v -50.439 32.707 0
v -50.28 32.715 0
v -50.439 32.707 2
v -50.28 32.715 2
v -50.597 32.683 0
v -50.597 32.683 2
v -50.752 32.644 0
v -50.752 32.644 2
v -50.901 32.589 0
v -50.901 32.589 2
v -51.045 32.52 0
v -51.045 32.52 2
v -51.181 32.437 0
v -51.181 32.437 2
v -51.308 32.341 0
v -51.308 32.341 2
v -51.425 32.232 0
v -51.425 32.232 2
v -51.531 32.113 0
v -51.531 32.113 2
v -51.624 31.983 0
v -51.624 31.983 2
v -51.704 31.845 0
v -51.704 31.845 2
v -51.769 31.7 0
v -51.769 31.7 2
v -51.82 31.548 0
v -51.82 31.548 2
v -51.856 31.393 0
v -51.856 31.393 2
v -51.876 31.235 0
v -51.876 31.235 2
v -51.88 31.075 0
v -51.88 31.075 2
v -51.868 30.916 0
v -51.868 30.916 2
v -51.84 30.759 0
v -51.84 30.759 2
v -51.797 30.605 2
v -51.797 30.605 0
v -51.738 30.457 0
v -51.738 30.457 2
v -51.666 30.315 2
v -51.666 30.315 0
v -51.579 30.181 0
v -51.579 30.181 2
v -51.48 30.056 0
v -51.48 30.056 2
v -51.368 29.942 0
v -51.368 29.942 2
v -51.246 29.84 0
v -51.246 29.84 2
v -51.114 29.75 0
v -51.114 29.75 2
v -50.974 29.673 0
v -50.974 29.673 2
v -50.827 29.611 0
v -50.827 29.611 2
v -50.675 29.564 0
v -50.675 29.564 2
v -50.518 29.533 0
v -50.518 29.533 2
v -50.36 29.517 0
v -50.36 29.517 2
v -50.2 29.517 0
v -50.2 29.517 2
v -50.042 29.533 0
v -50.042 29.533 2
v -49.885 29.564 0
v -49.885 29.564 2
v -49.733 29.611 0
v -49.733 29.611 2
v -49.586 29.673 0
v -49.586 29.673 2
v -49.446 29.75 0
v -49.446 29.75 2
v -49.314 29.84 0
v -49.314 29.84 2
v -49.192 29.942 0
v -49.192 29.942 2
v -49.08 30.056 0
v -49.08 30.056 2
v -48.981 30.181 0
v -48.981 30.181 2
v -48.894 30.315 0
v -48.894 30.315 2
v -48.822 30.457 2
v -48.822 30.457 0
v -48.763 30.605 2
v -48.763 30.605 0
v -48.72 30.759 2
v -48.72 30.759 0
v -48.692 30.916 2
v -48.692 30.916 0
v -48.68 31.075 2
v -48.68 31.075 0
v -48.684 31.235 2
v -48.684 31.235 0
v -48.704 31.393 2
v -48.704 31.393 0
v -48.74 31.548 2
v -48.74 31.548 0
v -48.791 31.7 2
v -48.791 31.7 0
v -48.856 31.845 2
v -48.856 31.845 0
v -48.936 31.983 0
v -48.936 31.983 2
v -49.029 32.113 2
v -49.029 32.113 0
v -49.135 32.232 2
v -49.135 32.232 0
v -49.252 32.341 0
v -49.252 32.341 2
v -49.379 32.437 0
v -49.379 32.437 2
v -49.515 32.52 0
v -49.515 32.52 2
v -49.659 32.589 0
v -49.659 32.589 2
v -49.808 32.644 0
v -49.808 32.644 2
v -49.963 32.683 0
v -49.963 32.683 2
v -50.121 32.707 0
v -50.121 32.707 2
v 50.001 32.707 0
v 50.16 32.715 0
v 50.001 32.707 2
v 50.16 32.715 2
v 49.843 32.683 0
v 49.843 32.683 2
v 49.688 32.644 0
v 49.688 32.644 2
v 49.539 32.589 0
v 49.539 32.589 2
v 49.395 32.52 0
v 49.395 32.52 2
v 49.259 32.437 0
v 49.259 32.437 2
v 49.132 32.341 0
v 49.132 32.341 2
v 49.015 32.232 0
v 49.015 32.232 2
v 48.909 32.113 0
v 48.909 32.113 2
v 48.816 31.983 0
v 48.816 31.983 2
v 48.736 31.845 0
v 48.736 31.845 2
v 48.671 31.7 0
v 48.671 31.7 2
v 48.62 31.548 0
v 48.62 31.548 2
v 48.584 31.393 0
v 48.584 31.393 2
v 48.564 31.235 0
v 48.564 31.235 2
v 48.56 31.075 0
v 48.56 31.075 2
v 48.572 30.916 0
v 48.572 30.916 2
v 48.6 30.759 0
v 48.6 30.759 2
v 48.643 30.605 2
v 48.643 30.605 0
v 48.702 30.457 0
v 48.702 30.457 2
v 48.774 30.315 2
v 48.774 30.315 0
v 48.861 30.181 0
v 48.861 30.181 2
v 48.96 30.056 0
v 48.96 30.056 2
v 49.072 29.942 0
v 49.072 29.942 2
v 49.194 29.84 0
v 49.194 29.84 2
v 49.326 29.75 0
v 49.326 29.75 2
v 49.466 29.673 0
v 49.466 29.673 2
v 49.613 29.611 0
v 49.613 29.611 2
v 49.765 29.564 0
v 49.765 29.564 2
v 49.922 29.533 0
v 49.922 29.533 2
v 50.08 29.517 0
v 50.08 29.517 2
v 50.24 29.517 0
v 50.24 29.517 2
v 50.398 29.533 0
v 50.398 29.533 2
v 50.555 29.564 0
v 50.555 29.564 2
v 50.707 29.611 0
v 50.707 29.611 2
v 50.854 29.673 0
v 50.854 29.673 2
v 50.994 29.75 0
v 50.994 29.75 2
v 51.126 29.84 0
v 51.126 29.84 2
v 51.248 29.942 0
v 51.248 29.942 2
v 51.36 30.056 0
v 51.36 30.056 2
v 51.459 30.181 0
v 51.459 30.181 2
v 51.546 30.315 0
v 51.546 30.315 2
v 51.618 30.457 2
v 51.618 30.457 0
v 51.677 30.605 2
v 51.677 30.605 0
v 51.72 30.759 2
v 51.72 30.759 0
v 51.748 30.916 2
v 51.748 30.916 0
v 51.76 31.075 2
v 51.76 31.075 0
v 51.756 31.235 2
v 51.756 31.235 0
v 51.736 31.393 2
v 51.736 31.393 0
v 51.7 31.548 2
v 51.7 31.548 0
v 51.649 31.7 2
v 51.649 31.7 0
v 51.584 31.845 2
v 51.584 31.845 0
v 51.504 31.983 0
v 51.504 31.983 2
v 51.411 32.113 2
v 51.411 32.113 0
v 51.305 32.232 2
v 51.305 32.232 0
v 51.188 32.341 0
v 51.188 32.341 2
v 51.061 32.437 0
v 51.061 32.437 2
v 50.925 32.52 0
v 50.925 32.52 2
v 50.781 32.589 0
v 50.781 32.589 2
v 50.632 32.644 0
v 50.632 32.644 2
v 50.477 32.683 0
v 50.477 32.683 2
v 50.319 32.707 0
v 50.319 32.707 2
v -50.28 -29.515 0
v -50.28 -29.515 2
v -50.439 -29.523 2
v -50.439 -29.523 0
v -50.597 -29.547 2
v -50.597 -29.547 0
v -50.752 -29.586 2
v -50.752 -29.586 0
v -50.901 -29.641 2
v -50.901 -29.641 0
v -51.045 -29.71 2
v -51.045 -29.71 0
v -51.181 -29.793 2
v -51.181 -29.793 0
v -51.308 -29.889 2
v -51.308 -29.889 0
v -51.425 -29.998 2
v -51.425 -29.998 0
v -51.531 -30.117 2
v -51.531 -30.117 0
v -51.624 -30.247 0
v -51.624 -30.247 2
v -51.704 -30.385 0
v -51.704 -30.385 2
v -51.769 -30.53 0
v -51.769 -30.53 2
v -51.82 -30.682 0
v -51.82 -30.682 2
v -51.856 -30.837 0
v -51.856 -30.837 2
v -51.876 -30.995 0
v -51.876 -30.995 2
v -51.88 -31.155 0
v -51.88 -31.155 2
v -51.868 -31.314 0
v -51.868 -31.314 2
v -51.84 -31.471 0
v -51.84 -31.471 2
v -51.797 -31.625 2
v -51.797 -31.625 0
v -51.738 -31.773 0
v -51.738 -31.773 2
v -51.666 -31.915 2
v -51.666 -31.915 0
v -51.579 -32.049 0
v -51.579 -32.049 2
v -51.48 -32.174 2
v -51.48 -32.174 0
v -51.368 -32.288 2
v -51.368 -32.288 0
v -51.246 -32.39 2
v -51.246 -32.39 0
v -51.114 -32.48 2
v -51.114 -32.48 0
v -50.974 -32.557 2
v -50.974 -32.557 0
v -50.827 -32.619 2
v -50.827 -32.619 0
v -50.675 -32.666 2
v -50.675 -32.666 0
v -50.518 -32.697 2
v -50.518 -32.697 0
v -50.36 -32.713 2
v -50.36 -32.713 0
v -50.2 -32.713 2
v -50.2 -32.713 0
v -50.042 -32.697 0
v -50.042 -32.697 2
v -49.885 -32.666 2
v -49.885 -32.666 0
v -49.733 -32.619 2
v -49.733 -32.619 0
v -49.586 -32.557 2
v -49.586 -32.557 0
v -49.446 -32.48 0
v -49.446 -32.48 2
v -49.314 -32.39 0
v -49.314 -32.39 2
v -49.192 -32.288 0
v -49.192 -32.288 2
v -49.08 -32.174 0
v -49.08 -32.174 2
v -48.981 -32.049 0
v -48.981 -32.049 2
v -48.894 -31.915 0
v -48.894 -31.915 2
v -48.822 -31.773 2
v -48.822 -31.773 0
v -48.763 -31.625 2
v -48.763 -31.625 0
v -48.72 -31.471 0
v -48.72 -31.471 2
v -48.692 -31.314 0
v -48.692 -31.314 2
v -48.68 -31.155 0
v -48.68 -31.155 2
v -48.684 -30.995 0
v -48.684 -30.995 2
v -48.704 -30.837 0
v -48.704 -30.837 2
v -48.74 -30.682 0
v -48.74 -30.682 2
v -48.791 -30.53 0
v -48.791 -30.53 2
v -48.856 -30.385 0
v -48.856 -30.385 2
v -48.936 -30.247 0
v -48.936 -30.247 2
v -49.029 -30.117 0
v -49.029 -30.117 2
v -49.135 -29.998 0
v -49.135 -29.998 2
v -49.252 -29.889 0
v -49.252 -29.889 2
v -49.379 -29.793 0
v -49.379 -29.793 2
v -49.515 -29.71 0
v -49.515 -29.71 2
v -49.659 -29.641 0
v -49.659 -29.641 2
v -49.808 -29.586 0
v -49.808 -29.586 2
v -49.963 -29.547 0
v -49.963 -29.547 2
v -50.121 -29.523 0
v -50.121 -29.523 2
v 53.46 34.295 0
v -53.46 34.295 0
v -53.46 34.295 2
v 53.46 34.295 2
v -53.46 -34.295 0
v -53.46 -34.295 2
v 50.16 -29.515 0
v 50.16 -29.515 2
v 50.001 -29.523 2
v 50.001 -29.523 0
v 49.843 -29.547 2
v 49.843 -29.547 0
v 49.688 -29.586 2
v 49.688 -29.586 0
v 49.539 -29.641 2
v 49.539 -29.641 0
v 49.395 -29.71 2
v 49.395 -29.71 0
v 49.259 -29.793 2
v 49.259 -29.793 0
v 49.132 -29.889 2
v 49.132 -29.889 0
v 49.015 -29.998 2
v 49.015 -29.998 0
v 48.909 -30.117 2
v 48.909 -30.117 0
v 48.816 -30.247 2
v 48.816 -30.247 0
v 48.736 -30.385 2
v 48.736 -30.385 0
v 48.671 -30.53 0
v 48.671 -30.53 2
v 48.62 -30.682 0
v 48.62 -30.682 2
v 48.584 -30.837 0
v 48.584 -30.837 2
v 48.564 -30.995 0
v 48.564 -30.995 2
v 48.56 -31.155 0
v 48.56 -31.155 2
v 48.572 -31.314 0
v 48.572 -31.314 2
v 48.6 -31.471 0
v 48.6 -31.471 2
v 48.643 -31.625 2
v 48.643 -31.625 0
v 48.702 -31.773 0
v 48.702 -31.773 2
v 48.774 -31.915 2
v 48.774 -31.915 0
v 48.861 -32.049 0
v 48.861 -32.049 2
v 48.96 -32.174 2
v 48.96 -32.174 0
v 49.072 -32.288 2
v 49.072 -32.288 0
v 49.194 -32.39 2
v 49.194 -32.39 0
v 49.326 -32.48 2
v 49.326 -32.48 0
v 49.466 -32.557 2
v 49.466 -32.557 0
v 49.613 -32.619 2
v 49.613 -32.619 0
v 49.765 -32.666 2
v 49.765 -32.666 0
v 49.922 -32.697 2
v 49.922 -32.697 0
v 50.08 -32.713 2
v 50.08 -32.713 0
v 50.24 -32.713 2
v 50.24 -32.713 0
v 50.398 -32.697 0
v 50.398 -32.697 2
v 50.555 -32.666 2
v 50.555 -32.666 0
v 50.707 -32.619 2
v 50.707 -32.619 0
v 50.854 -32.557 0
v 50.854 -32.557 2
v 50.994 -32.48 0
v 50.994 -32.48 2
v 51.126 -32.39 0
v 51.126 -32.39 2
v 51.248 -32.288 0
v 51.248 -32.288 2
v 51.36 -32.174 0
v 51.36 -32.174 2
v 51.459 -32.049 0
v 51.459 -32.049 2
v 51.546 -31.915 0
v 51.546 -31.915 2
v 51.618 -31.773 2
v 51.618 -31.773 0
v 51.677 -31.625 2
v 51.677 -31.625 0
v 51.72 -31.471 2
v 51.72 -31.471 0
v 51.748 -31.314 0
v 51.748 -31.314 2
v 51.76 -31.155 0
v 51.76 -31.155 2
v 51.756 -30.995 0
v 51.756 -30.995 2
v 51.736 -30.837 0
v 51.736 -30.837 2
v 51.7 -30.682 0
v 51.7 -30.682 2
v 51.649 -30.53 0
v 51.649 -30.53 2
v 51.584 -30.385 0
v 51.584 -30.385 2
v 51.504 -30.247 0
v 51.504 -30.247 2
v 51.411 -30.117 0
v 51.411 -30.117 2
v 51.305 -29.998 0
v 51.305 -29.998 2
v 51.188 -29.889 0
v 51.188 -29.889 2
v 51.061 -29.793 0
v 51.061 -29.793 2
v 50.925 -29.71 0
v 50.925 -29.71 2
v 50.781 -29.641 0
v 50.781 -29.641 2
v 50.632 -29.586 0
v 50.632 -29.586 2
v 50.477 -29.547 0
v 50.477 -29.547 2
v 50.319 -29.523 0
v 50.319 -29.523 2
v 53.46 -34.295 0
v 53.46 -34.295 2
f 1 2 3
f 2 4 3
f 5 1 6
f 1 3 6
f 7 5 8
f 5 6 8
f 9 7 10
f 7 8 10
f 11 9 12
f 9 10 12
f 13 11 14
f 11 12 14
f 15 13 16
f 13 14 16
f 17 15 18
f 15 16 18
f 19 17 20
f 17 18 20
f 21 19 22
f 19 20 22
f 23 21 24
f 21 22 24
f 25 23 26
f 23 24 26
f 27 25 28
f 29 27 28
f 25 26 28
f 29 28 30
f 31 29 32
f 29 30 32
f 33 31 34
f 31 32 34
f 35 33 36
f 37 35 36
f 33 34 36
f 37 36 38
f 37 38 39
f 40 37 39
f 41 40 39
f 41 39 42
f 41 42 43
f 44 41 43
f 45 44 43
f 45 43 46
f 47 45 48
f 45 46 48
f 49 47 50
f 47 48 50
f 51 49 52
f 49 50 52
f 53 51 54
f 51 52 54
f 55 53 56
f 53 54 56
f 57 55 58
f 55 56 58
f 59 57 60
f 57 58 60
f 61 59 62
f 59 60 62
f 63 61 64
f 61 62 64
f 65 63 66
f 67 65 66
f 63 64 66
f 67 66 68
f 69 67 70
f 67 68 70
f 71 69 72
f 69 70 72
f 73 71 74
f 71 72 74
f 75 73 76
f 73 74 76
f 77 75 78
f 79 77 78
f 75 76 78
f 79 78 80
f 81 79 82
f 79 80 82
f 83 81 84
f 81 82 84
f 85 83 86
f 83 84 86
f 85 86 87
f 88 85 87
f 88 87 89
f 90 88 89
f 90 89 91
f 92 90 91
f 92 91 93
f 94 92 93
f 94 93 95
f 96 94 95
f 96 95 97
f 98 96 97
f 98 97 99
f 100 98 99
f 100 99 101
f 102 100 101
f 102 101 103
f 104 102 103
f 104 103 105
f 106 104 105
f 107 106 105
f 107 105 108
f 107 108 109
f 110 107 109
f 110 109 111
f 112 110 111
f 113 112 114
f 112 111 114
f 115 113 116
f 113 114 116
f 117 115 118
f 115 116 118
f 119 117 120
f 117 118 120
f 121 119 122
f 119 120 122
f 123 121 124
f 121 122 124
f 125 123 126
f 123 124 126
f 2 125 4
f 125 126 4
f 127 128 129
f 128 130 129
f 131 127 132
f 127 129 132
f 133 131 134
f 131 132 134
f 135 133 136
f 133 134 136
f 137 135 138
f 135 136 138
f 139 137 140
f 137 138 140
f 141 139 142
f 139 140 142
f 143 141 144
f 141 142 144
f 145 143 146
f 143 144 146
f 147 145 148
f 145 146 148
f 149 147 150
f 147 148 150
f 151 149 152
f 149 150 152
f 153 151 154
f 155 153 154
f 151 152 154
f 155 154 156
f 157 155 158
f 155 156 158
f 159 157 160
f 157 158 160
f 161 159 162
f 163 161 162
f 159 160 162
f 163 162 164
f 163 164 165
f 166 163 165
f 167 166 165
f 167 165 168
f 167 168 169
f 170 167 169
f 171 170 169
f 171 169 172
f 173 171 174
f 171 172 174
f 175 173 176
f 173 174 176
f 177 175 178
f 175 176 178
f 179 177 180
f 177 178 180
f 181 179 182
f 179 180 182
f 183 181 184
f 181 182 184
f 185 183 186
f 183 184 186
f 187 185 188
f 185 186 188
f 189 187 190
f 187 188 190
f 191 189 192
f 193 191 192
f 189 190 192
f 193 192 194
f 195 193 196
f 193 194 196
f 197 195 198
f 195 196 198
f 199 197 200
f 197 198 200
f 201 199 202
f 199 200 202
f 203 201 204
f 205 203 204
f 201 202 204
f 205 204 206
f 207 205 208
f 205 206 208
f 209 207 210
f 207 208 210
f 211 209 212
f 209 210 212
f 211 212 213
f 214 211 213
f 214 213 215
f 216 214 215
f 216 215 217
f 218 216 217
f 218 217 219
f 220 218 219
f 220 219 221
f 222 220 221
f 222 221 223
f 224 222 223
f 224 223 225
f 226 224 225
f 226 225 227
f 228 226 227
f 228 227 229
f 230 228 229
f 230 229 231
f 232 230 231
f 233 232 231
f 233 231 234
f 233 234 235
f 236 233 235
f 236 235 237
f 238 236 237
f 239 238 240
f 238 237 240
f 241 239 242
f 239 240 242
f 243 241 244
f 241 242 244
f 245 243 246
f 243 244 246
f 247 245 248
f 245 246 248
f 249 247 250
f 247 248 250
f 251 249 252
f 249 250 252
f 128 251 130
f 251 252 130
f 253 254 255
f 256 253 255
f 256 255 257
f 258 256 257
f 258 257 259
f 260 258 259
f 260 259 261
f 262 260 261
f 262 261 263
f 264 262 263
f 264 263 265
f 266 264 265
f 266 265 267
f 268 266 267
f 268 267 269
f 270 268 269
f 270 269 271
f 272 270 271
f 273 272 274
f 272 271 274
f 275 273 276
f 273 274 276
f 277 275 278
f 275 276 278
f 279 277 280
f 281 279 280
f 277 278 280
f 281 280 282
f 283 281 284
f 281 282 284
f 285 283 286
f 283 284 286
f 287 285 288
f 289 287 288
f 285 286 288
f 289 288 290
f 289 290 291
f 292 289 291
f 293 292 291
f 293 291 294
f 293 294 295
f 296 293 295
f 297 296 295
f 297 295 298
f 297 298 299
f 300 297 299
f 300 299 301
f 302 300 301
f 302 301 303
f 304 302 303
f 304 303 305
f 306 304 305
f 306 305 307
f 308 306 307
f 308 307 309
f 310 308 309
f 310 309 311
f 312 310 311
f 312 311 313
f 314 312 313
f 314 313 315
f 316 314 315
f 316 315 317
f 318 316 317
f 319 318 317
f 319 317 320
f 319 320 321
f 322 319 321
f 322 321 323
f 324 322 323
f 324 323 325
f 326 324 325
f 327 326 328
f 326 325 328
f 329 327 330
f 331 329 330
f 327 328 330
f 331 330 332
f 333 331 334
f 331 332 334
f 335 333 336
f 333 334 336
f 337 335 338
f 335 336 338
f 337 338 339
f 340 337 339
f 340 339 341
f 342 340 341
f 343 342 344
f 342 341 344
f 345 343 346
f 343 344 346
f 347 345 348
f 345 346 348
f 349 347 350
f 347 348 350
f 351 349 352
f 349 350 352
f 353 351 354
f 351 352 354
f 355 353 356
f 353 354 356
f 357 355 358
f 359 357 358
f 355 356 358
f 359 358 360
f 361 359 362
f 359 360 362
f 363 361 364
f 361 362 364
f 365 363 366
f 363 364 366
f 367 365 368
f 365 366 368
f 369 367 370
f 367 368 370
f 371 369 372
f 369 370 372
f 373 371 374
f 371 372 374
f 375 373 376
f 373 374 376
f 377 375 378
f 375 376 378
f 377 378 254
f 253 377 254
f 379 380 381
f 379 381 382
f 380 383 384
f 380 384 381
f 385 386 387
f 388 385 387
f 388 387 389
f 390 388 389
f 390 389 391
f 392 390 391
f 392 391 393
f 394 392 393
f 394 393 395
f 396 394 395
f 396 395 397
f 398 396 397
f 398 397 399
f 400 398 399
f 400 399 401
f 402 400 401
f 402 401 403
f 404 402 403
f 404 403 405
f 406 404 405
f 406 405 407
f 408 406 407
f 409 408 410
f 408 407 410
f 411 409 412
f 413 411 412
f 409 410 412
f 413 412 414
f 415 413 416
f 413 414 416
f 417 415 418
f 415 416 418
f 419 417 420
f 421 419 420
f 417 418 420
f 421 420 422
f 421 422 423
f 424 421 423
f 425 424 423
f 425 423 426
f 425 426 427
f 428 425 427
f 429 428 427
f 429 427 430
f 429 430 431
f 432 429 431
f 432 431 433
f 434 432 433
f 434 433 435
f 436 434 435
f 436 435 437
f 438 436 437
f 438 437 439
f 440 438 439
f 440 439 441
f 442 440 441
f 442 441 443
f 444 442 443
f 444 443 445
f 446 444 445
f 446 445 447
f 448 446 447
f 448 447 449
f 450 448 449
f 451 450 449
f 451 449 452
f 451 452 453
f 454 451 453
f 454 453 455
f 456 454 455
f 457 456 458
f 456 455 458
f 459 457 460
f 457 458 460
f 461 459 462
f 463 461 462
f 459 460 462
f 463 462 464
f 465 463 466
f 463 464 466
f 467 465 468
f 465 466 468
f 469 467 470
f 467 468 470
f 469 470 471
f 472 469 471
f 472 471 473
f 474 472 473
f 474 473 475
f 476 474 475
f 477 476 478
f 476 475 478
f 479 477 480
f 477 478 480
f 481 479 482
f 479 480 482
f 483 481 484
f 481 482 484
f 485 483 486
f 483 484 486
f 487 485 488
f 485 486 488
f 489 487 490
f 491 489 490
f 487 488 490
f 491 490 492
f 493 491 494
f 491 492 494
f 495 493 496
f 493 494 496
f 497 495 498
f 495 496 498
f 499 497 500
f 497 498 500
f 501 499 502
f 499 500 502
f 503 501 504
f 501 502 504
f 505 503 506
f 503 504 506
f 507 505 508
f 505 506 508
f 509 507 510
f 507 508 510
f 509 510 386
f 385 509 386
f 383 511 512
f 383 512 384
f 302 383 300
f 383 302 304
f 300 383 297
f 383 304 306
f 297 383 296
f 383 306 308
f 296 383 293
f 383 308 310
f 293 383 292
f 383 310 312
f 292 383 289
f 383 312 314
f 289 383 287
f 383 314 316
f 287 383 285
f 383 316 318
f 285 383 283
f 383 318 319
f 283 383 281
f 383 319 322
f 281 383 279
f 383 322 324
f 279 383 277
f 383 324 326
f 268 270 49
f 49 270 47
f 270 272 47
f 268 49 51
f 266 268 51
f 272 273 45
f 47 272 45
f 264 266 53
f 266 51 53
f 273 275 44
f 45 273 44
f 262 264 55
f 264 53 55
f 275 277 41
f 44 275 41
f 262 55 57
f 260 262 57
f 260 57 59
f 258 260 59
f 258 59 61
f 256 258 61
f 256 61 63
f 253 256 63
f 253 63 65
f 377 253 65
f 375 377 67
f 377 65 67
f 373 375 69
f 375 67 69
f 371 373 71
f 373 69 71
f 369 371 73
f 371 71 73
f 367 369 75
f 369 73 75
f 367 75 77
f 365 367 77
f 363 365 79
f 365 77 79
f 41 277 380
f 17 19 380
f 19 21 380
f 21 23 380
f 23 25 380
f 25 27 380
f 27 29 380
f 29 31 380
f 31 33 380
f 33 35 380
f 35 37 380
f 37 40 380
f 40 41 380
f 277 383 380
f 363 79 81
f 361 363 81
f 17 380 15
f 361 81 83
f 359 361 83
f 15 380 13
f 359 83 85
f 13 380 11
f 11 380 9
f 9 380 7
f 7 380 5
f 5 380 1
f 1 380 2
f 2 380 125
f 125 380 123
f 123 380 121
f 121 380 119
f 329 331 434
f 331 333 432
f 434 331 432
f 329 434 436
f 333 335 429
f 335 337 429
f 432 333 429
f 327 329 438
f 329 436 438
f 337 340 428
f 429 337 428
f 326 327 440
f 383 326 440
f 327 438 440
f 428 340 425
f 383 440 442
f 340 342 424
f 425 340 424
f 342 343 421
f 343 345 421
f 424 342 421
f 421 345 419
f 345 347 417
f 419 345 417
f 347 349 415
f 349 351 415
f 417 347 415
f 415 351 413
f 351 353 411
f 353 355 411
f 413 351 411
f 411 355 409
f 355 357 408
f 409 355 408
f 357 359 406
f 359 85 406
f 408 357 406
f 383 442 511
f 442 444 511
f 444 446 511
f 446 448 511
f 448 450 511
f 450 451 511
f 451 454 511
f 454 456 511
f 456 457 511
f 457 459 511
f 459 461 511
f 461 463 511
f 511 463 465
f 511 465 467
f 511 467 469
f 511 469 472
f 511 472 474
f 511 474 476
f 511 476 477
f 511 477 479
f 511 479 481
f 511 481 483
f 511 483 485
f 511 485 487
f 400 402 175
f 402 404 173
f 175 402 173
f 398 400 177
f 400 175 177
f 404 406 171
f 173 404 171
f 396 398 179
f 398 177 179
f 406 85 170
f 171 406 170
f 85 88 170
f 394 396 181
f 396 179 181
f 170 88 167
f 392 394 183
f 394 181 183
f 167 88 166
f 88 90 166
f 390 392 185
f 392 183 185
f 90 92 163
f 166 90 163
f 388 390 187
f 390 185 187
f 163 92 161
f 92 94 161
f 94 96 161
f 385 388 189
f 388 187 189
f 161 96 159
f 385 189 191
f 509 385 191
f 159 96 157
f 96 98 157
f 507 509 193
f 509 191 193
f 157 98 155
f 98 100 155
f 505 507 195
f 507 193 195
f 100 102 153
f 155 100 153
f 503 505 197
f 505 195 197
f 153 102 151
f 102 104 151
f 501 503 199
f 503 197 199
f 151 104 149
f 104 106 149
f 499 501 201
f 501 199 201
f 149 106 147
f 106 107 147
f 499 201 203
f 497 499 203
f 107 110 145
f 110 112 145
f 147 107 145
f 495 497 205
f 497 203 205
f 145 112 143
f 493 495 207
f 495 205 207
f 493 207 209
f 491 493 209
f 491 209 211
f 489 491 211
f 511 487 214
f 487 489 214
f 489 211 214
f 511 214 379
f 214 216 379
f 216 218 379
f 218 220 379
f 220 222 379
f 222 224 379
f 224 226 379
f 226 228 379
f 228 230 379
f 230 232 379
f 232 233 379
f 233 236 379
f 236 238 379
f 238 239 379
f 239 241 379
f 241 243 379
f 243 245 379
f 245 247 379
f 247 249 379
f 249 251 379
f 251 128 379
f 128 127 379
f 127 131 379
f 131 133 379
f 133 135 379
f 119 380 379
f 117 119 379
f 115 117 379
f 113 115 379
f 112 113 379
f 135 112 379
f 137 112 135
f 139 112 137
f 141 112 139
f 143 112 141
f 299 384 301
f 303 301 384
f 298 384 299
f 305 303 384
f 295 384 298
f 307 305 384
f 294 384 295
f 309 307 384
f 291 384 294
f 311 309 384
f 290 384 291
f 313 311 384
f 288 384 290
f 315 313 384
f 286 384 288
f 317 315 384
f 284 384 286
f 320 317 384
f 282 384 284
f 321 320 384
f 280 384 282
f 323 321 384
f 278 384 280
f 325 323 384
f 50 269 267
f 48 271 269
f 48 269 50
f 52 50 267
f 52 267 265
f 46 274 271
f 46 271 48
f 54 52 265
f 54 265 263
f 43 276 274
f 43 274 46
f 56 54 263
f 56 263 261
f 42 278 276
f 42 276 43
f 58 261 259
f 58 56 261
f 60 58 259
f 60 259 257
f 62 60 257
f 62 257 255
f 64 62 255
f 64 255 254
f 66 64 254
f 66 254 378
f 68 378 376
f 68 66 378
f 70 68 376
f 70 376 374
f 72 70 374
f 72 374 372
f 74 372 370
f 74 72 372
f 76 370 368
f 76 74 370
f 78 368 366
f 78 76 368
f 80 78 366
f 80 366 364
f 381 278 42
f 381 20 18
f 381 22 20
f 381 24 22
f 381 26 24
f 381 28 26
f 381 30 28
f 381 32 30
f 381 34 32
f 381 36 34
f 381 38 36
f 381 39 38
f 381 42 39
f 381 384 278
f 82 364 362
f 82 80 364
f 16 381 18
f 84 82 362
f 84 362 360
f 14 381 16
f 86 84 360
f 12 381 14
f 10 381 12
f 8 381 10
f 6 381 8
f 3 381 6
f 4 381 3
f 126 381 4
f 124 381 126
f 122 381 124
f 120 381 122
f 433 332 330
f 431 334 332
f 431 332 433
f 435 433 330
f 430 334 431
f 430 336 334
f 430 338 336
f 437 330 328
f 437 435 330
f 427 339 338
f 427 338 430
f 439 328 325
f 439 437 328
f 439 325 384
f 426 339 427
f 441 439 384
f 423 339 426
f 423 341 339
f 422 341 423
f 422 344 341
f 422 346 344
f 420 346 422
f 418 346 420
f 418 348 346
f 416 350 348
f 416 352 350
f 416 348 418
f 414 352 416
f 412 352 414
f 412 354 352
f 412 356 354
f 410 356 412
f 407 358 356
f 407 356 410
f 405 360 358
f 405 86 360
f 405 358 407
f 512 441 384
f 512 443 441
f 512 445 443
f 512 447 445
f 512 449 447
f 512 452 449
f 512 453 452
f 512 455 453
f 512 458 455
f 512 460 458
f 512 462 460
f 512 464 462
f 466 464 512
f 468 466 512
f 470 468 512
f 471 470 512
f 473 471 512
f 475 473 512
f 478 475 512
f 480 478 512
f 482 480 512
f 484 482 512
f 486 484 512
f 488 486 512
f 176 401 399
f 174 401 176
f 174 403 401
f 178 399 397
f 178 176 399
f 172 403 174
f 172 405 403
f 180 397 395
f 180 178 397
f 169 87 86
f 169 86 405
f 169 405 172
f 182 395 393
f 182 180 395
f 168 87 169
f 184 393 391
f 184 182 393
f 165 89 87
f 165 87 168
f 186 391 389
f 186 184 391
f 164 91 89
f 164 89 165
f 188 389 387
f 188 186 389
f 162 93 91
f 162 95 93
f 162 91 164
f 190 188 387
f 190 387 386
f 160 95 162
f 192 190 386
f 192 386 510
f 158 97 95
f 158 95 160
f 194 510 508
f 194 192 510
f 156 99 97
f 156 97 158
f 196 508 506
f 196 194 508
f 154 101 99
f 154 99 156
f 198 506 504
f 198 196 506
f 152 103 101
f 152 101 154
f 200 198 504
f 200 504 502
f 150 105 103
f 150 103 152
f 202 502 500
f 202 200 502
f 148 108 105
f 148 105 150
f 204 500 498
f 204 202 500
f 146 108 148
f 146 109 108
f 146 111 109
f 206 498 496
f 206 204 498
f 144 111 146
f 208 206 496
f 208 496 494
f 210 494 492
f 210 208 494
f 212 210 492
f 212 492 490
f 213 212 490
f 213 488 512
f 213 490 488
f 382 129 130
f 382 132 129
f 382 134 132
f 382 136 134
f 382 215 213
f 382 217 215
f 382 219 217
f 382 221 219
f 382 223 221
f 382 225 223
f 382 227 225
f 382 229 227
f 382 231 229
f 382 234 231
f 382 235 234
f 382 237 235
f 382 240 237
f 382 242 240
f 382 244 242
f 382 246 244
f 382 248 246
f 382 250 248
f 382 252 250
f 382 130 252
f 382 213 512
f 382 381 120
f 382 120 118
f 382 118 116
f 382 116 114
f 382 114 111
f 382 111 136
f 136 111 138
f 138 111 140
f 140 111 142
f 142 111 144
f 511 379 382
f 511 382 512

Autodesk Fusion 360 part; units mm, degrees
sketch "Sketch1" plane through (0, 0, 0) normal (0, 0, 1) x (1, 0, 0)
  line L0 (53.46, -34.295) -> (-53.46, -34.295)
  line L1 (-53.46, -34.295) -> (-53.46, 34.295)
  line L2 (-53.46, 34.295) -> (53.46, 34.295)
  line L3 (53.46, 34.295) -> (53.46, -34.295)
  line L4 (53.46, -34.295) -> (-53.46, 34.295) construction
  line L5 (-53.46, -34.295) -> (53.46, 34.295) construction
  line L6 (-50.28, 31.115) -> (50.16, 31.115) construction
  line L7 (50.16, 31.115) -> (50.16, -31.115) construction
  line L8 (50.16, -31.115) -> (-50.28, -31.115) construction
  line L9 (-50.28, -31.115) -> (-50.28, 31.115) construction
  dimension "d1" = 106.92
  dimension "d2" = 68.59
  dimension "d5" = 3.18
  dimension "d6" = 3.18
  dimension "d7" = 100.44
  dimension "d8" = 62.23
extrude "Extrude1" add sketch "Sketch1" along normal blind 2
hole "Hole1" at (-50.28, 31.115, 0) at (-50.28, -31.115, 0) at (50.16, -31.115, 0) at (50.16, 31.115, 0) direction (0, 0, 1) diameter 3.2 end up to surface (2 mm away)
equation "d2 = 65.41 mm + 3.18 mm"
